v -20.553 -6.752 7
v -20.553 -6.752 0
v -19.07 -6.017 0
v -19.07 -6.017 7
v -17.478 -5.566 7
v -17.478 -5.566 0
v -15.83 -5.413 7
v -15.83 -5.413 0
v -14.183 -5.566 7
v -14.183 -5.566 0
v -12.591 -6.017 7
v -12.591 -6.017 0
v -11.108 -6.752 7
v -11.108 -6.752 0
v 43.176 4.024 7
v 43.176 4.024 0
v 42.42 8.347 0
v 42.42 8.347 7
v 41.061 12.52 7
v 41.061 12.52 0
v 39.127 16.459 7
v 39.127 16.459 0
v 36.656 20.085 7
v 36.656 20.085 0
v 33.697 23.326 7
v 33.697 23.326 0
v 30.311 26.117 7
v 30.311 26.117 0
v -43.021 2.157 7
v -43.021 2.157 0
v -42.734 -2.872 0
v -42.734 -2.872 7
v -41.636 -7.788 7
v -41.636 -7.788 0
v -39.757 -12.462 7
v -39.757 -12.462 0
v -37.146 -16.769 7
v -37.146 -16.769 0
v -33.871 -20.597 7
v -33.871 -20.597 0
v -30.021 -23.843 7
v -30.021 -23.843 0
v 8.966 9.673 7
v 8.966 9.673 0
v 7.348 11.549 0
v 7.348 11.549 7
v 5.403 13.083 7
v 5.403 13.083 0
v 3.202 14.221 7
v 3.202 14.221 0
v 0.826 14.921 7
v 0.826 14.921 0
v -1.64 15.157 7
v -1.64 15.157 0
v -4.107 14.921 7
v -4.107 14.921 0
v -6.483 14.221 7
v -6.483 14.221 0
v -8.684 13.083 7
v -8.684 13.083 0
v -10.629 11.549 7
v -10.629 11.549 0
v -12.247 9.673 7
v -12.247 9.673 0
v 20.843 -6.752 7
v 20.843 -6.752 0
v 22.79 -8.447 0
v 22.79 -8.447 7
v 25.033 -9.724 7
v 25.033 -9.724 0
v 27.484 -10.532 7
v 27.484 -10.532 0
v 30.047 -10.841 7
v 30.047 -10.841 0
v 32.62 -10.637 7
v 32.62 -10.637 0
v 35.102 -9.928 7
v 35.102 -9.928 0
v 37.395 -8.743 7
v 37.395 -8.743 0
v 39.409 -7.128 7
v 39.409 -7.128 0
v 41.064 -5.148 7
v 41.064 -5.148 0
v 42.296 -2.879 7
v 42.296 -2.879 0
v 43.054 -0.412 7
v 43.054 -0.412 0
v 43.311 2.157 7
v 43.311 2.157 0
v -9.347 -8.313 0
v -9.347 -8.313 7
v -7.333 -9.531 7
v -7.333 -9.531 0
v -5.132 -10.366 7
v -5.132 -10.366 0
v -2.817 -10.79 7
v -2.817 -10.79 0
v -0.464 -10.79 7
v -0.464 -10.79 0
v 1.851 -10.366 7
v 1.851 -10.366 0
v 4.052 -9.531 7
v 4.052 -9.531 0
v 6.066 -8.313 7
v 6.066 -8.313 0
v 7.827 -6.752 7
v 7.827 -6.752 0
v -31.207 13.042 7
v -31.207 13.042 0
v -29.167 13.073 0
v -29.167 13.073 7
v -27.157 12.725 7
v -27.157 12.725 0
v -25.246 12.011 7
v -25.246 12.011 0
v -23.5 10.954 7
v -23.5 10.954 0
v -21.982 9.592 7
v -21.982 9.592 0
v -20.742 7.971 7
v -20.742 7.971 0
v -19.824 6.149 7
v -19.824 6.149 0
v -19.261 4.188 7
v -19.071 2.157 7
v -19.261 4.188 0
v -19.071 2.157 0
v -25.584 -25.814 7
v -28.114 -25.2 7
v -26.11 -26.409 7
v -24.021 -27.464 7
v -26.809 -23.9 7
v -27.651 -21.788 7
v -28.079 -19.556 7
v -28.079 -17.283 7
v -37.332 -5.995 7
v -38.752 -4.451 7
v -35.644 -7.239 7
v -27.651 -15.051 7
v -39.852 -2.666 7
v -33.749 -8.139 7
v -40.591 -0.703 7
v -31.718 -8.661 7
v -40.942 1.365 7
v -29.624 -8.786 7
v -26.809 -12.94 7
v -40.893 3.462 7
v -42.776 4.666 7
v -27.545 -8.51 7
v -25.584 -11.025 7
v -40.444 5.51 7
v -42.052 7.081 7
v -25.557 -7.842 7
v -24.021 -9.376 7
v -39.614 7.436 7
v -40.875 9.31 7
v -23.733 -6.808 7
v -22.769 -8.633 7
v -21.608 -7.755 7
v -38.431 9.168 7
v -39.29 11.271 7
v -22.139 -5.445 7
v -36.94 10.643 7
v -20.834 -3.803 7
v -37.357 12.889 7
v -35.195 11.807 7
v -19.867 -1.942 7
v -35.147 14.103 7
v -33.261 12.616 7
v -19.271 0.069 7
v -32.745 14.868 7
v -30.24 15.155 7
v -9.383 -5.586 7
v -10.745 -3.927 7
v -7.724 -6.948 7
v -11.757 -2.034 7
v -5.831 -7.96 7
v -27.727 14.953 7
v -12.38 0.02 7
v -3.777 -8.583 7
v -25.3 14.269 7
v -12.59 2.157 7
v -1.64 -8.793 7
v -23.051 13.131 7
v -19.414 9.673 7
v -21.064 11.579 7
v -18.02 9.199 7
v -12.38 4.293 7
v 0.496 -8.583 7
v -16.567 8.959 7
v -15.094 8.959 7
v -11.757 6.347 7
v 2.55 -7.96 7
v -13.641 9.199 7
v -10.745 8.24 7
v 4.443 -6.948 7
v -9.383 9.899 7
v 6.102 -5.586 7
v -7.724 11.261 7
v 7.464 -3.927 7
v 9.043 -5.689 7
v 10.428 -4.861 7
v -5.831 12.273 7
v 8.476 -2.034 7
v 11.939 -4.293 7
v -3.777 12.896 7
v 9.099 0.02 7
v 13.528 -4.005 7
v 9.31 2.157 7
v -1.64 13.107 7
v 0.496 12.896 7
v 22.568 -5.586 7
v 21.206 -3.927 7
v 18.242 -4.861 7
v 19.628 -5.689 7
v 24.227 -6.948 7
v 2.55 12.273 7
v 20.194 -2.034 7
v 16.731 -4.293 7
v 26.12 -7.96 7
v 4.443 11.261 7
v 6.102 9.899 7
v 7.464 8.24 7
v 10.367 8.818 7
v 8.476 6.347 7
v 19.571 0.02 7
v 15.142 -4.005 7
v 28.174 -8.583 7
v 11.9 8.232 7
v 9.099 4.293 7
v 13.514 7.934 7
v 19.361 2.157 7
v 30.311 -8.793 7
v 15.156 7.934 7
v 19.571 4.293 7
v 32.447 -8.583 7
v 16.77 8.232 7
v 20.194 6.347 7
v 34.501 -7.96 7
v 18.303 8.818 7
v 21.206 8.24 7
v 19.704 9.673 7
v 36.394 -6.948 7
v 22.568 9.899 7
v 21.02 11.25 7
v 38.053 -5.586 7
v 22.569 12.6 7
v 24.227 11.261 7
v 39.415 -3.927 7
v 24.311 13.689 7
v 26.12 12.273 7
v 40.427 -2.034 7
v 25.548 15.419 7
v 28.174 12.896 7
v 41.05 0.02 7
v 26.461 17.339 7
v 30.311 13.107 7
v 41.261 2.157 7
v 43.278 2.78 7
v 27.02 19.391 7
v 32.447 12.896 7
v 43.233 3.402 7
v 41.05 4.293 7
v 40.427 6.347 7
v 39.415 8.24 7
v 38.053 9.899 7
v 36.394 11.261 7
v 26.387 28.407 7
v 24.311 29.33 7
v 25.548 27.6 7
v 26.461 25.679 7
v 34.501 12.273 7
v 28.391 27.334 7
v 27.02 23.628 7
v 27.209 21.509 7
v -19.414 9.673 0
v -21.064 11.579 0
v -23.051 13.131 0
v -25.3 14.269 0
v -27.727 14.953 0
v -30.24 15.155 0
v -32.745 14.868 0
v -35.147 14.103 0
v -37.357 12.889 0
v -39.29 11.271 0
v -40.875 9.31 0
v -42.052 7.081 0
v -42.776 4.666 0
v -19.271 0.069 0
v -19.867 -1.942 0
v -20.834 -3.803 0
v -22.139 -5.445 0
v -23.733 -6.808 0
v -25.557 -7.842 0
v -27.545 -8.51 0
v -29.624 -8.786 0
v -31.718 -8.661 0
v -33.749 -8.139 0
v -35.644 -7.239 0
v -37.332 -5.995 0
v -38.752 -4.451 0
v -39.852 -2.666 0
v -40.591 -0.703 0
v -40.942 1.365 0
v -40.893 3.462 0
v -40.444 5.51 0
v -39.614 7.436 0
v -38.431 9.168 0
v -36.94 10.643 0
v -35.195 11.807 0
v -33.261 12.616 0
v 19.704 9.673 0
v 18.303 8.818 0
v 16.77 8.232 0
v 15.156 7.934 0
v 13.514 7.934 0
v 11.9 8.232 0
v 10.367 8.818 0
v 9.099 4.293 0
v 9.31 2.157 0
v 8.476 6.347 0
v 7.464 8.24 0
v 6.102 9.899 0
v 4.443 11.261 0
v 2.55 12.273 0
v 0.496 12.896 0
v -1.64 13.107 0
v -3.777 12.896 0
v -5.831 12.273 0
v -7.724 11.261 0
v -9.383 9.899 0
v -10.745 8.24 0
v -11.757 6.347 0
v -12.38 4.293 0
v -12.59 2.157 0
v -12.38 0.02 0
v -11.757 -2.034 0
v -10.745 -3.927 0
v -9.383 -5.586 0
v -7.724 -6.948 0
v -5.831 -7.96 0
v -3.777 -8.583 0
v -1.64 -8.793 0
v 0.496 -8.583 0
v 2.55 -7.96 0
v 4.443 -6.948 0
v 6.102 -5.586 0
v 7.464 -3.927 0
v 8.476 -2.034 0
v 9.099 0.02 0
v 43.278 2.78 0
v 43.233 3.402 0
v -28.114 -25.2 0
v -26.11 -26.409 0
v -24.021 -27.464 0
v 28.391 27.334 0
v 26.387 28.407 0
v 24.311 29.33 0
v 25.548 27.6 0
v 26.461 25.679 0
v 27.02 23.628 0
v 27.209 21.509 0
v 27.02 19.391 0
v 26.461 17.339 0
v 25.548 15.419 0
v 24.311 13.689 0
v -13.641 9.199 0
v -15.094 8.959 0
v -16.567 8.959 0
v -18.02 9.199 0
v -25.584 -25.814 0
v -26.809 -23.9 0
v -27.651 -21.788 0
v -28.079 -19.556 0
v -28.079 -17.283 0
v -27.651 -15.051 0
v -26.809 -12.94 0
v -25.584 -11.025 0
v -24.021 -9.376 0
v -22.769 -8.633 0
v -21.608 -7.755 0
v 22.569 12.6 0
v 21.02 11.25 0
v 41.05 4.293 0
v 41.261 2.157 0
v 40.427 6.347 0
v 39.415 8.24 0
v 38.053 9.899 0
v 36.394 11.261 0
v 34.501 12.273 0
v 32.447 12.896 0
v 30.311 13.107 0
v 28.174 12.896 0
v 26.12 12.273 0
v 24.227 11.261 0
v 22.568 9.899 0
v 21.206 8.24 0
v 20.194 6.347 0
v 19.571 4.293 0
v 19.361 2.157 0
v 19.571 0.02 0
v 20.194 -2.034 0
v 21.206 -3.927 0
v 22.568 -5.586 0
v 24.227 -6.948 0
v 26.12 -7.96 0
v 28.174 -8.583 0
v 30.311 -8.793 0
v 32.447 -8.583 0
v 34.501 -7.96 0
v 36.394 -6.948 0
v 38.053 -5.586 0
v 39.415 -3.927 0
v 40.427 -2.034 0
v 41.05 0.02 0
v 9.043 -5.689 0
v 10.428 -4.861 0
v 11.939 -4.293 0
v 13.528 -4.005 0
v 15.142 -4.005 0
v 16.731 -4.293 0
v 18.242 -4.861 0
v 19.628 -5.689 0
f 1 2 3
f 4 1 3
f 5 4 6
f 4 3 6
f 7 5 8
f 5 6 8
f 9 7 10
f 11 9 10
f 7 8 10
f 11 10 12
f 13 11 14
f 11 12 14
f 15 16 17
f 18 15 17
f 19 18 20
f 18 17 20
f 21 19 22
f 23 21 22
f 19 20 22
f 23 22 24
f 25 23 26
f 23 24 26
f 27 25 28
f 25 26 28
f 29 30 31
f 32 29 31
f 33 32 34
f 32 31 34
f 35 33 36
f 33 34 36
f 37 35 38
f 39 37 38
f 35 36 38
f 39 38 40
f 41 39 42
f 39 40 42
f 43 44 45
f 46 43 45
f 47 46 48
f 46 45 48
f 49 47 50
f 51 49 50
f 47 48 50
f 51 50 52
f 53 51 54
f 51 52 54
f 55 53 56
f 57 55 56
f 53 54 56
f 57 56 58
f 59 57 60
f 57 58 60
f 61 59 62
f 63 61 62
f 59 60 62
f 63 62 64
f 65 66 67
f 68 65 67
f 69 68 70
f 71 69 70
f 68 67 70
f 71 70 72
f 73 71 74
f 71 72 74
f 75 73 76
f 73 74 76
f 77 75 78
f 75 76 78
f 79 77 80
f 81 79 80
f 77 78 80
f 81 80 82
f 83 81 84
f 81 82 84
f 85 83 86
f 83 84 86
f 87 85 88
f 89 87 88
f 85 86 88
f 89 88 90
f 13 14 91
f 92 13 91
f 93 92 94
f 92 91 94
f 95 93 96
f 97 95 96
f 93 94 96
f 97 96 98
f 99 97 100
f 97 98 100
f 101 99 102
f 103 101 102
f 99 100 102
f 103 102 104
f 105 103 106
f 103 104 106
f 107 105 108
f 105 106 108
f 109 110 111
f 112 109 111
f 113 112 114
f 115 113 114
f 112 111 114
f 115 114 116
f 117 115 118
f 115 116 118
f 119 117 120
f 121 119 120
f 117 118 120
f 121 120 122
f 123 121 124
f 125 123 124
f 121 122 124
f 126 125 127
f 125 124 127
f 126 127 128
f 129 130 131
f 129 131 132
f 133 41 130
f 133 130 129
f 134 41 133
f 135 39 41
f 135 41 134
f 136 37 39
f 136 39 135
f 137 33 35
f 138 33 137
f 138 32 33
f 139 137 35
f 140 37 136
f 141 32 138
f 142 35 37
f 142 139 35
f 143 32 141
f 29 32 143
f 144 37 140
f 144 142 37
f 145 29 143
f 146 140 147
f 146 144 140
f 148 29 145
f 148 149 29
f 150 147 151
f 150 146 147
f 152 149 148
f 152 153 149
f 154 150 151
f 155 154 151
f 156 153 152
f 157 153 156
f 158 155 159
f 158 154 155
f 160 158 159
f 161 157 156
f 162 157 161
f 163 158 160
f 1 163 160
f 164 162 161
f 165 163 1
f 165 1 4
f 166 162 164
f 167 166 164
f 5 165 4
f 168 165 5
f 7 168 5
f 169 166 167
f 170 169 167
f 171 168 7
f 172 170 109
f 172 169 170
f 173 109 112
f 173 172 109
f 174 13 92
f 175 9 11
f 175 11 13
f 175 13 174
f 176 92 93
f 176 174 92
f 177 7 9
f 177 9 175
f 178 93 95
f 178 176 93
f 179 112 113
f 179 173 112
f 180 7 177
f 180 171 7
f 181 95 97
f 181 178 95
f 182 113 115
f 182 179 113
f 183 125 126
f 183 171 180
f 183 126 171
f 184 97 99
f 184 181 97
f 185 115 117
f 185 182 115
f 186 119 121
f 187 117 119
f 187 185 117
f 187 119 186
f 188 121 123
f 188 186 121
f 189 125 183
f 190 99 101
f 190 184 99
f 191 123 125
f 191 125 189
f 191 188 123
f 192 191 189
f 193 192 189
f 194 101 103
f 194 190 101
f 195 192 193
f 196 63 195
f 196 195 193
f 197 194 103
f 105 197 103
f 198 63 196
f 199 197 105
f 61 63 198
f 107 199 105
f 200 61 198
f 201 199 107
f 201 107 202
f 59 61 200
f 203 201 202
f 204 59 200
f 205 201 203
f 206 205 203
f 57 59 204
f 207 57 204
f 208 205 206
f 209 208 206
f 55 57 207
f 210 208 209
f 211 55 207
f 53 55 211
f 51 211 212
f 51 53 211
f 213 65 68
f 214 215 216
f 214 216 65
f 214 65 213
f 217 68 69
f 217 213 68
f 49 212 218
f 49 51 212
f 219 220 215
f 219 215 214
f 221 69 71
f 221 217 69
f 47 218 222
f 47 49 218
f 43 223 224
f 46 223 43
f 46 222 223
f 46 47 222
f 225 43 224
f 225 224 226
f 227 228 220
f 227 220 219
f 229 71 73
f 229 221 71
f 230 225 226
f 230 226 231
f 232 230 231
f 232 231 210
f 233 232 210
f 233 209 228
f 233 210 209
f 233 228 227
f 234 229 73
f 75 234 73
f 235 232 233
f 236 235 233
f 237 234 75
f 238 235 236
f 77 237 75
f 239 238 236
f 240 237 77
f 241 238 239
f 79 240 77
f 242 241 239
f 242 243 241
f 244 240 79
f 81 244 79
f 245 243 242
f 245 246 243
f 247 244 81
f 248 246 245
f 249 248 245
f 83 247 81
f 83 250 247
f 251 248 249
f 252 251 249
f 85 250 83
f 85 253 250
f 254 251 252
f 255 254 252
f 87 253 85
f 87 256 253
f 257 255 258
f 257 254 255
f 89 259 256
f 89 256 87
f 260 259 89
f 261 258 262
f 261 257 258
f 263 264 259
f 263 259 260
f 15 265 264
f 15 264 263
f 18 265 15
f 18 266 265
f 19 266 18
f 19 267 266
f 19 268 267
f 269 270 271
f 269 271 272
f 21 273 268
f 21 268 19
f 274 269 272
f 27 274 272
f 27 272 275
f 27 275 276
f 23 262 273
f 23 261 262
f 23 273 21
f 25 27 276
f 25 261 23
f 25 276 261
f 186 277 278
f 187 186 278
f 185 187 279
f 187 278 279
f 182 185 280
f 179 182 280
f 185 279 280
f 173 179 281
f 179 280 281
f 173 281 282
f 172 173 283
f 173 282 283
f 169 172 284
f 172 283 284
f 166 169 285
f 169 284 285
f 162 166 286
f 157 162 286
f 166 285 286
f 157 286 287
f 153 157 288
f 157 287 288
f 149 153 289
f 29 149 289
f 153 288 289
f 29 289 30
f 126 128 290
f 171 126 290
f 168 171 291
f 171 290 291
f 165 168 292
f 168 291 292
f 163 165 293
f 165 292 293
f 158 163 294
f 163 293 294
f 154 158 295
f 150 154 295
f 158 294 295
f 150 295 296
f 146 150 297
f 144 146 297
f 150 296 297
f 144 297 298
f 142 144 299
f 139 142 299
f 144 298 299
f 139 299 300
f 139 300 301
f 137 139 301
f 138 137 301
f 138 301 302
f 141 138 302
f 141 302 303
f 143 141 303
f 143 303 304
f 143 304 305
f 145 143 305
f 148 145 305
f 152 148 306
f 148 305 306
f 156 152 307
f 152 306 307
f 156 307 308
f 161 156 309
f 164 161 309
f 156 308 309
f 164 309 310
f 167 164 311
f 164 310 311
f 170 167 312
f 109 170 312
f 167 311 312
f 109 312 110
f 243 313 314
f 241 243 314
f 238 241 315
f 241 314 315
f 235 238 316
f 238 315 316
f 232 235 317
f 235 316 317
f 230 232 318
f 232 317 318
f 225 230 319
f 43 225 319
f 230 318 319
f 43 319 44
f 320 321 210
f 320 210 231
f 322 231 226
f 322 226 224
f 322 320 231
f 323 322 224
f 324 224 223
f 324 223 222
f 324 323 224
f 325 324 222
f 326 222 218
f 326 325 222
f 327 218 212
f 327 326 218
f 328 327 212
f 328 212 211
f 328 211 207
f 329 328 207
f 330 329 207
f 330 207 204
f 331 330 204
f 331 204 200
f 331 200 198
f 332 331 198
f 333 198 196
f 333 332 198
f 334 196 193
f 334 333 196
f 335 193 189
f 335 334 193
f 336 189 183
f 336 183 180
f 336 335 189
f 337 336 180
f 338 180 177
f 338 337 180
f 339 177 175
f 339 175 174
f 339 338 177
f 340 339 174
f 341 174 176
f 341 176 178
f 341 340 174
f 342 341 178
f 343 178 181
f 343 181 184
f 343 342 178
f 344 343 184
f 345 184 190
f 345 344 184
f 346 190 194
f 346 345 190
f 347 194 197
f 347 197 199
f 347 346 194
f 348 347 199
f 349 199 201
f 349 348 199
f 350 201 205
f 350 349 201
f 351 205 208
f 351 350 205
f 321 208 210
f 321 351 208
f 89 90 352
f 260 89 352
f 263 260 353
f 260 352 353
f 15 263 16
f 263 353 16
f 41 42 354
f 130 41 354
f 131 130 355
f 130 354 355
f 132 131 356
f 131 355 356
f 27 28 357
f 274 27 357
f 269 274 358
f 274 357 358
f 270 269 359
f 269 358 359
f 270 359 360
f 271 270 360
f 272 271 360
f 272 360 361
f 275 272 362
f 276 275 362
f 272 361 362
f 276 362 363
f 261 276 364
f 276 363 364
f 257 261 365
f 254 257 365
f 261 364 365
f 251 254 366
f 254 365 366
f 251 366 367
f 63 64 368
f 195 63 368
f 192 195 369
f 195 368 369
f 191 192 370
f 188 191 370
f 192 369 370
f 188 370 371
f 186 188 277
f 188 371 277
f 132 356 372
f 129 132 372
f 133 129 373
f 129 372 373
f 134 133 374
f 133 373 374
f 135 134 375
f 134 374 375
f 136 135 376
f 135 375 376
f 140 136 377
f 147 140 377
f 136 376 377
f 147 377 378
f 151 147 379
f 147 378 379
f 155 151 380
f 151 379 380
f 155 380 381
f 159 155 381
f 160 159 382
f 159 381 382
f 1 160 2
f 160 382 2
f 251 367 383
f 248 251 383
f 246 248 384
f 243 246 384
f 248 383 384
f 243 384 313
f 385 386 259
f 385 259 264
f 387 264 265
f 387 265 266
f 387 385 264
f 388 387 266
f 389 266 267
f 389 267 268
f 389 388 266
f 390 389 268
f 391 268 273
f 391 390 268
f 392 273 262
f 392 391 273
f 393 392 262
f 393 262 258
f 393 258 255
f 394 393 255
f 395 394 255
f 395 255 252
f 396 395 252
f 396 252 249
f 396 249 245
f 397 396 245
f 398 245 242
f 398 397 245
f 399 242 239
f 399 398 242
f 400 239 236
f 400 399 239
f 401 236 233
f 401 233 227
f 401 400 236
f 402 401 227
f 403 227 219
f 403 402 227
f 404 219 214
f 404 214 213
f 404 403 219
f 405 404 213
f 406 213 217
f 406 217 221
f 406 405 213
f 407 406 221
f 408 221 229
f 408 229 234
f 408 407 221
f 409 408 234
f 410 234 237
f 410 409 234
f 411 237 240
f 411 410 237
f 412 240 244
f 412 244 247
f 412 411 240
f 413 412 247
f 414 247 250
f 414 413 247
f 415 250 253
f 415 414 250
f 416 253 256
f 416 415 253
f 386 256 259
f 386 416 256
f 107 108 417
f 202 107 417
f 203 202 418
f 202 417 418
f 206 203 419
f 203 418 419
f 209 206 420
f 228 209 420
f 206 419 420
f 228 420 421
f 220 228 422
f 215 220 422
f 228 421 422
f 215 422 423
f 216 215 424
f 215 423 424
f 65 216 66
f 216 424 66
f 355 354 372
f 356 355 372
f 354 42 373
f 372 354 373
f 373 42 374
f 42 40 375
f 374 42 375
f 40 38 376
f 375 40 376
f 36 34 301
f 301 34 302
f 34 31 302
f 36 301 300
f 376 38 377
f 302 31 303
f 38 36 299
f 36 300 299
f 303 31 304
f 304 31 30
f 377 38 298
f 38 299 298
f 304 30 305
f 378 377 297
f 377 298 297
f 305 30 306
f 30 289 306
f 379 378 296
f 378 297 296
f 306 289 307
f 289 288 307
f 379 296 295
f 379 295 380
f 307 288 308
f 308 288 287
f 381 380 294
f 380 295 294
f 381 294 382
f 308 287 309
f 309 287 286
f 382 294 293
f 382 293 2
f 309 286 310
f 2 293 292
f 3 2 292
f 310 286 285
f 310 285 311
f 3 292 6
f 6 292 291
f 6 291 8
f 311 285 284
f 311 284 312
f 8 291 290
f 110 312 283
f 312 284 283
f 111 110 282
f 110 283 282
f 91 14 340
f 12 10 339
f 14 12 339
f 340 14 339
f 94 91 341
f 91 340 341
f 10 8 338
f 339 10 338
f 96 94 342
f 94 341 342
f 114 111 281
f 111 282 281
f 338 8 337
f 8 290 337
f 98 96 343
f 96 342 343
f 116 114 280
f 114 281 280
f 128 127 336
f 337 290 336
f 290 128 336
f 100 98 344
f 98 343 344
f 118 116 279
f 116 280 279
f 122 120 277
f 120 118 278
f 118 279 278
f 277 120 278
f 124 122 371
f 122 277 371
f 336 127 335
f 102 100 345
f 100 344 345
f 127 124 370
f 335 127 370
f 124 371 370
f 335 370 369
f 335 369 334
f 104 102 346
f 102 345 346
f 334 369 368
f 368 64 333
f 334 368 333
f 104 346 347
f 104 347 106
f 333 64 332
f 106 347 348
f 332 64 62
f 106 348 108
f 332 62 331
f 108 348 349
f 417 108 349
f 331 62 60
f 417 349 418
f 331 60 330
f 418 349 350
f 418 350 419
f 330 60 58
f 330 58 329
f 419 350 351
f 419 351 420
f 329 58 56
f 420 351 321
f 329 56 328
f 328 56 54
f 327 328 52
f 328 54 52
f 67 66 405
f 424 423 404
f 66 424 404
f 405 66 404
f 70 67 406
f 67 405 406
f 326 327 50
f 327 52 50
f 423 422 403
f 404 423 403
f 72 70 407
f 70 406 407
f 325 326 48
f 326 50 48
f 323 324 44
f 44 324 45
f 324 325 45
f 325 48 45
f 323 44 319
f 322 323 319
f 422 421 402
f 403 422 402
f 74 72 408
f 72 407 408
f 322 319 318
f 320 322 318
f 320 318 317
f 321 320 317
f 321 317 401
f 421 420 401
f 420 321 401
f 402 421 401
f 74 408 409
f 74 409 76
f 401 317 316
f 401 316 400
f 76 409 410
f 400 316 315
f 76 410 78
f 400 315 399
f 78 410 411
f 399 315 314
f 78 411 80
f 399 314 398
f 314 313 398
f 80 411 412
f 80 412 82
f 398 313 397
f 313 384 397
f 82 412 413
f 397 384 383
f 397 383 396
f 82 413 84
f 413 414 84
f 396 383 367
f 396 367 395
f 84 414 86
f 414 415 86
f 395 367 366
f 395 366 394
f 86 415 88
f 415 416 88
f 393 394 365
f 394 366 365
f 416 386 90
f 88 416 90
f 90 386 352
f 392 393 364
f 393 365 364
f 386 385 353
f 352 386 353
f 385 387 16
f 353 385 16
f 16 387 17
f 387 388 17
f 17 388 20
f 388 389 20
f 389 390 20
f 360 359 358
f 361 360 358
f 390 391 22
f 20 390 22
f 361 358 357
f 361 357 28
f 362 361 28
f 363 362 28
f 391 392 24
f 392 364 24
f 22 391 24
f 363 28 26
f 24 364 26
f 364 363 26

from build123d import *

# Parameters (mm, degrees)
F0_R     = 10.95
F1_DEPTH = 7


# Not quite as in the source:
# - a feature names something its author has since deleted; it is built from what else it names


with BuildPart() as f1:
    # F0 (on Top) → F1 (new body)
    with BuildSketch(Plane.XY):
        with BuildLine():
            ThreePointArc((-20.552952936, -6.752012725), (-17.9358713071, -2.6350535567), (-17.0205455745, 2.1566734649))
            ThreePointArc((-17.0205455745, 2.1566734649), (-17.6332758432, 6.1007257723), (-19.4137068981, 9.672987275))
            ThreePointArc((-19.4137068981, 9.672987275), (-33.9645978819, 14.5439431963), (-43.0205455745, 2.1566734649))
            ThreePointArc((-43.0205455745, 2.1566734649), (-36.7659143561, -8.9563819205), (-24.0205455745, -9.3758891297))
            ThreePointArc((-24.0205455745, -9.3758891297), (-22.176261837, -8.2099659445), (-20.552952936, -6.752012725))
        make_face()
        with BuildLine():
            ThreePointArc((-31.2069165924, 13.042215427), (-22.7091935329, 10.3081537797), (-19.0705455745, 2.1566734649))
            ThreePointArc((-19.0705455745, 2.1566734649), (-22.7091935329, -5.9948068499), (-31.2069165924, -8.7288684971))
            ThreePointArc((-31.2069165924, -8.7288684971), (-40.9705455745, 2.1566734649), (-31.2069165924, 13.042215427))
        make_face(mode=Mode.SUBTRACT)
        with BuildLine():
            ThreePointArc((-19.4137068981, 9.672987275), (-17.6332758432, 6.1007257723), (-17.0205455745, 2.1566734649))
            ThreePointArc((-17.0205455745, 2.1566734649), (-17.9358713071, -2.6350535567), (-20.552952936, -6.752012725))
            ThreePointArc((-20.552952936, -6.752012725), (-15.8304691356, -5.4134843039), (-11.1079853352, -6.752012725))
            ThreePointArc((-11.1079853352, -6.752012725), (-14.6092343722, 1.2571482598), (-12.2472313731, 9.672987275))
            ThreePointArc((-12.2472313731, 9.672987275), (-15.8304691356, 8.9289189085), (-19.4137068981, 9.672987275))
        make_face()
        with BuildLine():
            ThreePointArc((-24.0205455745, -9.3758891297), (-36.7659143561, -8.9563819205), (-43.0205455745, 2.1566734649))
            ThreePointArc((-43.0205455745, 2.1566734649), (-39.7569738909, -12.4615406932), (-30.0205455745, -23.8433265351))
            ThreePointArc((-30.0205455745, -23.8433265351), (-27.1231782319, -25.8236586783), (-24.0205455745, -27.4638182769))
            ThreePointArc((-24.0205455745, -27.4638182769), (-28.1334228551, -18.4198537033), (-24.0205455745, -9.3758891297))
        make_face()
        with BuildLine():
            ThreePointArc((8.9664459798, 9.672987275), (-1.6403926966, 15.1566734649), (-12.2472313731, 9.672987275))
            ThreePointArc((-12.2472313731, 9.672987275), (-14.6092343722, 1.2571482598), (-11.1079853352, -6.752012725))
            ThreePointArc((-11.1079853352, -6.752012725), (-1.6403926966, -10.8433265351), (7.8271999419, -6.752012725))
            ThreePointArc((7.8271999419, -6.752012725), (10.4442815708, -2.6350535567), (11.3596073034, 2.1566734649))
            ThreePointArc((11.3596073034, 2.1566734649), (10.7468770347, 6.1007257723), (8.9664459798, 9.672987275))
        make_face()
        with Locations((-1.6403926966, 2.1566734649)):
            Circle(F0_R, mode=Mode.SUBTRACT)
        with BuildLine():
            ThreePointArc((19.7036979596, 9.672987275), (14.3350719697, 7.8964113233), (8.9664459798, 9.672987275))
            ThreePointArc((8.9664459798, 9.672987275), (10.7468770347, 6.1007257723), (11.3596073034, 2.1566734649))
            ThreePointArc((11.3596073034, 2.1566734649), (10.4442815708, -2.6350535567), (7.8271999419, -6.752012725))
            ThreePointArc((7.8271999419, -6.752012725), (14.3350719697, -3.9687322514), (20.8429439975, -6.752012725))
            ThreePointArc((20.8429439975, -6.752012725), (17.3416949605, 1.2571482598), (19.7036979596, 9.672987275))
        make_face()
        with BuildLine():
            ThreePointArc((24.310536636, 13.6892360596), (21.767742229, 11.9556868703), (19.7036979596, 9.672987275))
            ThreePointArc((19.7036979596, 9.672987275), (17.3416949605, 1.2571482598), (20.8429439975, -6.752012725))
            ThreePointArc((20.8429439975, -6.752012725), (35.1022636576, -9.9280008025), (43.310536636, 2.1566734649))
            ThreePointArc((43.310536636, 2.1566734649), (43.2572345725, 3.0913245901), (43.1757344795, 4.0239400363))
            ThreePointArc((43.1757344795, 4.0239400363), (36.2382024635, 13.7265817549), (24.310536636, 13.6892360596))
        make_face()
        with Locations((30.310536636, 2.1566734649)):
            Circle(F0_R, mode=Mode.SUBTRACT)
        with BuildLine():
            ThreePointArc((24.310536636, 29.3296992304), (27.2086699071, 21.509467645), (24.310536636, 13.6892360596))
            ThreePointArc((24.310536636, 13.6892360596), (36.2382024635, 13.7265817549), (43.1757344795, 4.0239400363))
            ThreePointArc((43.1757344795, 4.0239400363), (39.126790521, 16.45868474), (30.310536636, 26.1173849869))
            ThreePointArc((30.310536636, 26.1173849869), (27.3989585648, 27.8886976733), (24.310536636, 29.3296992304))
        make_face()
    extrude(amount=F1_DEPTH)


solid = f1.part
